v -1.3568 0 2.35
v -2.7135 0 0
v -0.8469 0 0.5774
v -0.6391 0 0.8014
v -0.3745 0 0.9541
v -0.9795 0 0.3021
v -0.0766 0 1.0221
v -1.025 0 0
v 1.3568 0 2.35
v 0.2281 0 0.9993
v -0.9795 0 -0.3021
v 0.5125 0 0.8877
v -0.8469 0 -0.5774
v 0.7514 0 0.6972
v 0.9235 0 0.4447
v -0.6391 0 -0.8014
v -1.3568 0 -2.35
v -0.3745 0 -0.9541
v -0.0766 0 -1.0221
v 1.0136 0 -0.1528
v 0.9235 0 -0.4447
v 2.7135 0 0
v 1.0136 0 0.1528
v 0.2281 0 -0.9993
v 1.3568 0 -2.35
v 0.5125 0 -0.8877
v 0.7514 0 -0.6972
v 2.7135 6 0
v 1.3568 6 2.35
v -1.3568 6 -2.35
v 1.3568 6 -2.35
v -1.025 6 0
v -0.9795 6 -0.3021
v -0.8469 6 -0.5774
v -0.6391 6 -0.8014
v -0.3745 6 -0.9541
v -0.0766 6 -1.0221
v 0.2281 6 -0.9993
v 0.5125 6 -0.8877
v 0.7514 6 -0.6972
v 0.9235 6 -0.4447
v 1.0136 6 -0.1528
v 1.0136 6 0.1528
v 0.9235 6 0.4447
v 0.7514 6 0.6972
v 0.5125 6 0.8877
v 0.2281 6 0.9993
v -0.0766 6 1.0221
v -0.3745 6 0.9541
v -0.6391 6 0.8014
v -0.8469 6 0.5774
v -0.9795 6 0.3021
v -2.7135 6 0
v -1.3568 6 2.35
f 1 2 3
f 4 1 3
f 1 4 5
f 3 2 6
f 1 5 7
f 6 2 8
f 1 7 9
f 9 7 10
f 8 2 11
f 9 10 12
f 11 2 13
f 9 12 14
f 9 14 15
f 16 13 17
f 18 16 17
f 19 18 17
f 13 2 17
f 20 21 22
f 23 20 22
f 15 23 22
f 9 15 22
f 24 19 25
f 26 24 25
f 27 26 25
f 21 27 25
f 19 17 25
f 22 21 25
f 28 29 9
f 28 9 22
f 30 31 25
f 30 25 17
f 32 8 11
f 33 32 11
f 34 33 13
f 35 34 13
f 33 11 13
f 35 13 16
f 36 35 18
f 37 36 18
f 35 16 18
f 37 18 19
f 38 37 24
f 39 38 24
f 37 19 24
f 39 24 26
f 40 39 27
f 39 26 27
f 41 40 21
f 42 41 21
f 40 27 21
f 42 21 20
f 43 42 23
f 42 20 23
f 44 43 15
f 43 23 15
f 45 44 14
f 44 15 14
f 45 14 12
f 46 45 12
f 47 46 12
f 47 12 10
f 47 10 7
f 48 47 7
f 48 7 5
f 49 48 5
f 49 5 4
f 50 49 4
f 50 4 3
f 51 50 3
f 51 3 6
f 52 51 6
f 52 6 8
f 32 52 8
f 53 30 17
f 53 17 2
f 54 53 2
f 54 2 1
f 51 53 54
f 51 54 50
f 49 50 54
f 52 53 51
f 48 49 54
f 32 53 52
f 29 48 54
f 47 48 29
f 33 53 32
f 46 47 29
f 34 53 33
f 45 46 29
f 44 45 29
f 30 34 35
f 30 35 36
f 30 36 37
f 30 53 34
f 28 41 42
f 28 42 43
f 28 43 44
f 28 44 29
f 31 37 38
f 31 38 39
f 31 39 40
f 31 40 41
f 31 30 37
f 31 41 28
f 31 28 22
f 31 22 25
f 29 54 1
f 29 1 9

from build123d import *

# Parameters (mm, degrees)
BOSS_EXTRUDE1_DEPTH                = 6
TAP_DRILL_FOR_M2_5X0_45_TAP1_D     = 2.05
TAP_DRILL_FOR_M2_5X0_45_TAP1_DEPTH = 19


with BuildPart() as part:
    # Sketch1 → Boss-Extrude1 (new body)
    with BuildSketch(Plane(origin=(0, 6, 0), x_dir=(1, 0, 0), z_dir=(0, 1, 0))):
        Polygon((1.356773133, -2.35), (2.713546265, 0), (1.356773133, 2.35), (-1.356773133, 2.35), (-2.713546265, 0), (-1.356773133, -2.35), align=None)
    extrude(amount=-BOSS_EXTRUDE1_DEPTH)

    # Tap Drill for M2.5x0.45 Tap1
    with Locations(Plane(origin=(0, 6, 0), x_dir=(1, 0, 0), z_dir=(0, 1, 0))):
        with Locations((0, 0)):
            Hole(TAP_DRILL_FOR_M2_5X0_45_TAP1_D / 2, depth=TAP_DRILL_FOR_M2_5X0_45_TAP1_DEPTH)


solid = part.part
